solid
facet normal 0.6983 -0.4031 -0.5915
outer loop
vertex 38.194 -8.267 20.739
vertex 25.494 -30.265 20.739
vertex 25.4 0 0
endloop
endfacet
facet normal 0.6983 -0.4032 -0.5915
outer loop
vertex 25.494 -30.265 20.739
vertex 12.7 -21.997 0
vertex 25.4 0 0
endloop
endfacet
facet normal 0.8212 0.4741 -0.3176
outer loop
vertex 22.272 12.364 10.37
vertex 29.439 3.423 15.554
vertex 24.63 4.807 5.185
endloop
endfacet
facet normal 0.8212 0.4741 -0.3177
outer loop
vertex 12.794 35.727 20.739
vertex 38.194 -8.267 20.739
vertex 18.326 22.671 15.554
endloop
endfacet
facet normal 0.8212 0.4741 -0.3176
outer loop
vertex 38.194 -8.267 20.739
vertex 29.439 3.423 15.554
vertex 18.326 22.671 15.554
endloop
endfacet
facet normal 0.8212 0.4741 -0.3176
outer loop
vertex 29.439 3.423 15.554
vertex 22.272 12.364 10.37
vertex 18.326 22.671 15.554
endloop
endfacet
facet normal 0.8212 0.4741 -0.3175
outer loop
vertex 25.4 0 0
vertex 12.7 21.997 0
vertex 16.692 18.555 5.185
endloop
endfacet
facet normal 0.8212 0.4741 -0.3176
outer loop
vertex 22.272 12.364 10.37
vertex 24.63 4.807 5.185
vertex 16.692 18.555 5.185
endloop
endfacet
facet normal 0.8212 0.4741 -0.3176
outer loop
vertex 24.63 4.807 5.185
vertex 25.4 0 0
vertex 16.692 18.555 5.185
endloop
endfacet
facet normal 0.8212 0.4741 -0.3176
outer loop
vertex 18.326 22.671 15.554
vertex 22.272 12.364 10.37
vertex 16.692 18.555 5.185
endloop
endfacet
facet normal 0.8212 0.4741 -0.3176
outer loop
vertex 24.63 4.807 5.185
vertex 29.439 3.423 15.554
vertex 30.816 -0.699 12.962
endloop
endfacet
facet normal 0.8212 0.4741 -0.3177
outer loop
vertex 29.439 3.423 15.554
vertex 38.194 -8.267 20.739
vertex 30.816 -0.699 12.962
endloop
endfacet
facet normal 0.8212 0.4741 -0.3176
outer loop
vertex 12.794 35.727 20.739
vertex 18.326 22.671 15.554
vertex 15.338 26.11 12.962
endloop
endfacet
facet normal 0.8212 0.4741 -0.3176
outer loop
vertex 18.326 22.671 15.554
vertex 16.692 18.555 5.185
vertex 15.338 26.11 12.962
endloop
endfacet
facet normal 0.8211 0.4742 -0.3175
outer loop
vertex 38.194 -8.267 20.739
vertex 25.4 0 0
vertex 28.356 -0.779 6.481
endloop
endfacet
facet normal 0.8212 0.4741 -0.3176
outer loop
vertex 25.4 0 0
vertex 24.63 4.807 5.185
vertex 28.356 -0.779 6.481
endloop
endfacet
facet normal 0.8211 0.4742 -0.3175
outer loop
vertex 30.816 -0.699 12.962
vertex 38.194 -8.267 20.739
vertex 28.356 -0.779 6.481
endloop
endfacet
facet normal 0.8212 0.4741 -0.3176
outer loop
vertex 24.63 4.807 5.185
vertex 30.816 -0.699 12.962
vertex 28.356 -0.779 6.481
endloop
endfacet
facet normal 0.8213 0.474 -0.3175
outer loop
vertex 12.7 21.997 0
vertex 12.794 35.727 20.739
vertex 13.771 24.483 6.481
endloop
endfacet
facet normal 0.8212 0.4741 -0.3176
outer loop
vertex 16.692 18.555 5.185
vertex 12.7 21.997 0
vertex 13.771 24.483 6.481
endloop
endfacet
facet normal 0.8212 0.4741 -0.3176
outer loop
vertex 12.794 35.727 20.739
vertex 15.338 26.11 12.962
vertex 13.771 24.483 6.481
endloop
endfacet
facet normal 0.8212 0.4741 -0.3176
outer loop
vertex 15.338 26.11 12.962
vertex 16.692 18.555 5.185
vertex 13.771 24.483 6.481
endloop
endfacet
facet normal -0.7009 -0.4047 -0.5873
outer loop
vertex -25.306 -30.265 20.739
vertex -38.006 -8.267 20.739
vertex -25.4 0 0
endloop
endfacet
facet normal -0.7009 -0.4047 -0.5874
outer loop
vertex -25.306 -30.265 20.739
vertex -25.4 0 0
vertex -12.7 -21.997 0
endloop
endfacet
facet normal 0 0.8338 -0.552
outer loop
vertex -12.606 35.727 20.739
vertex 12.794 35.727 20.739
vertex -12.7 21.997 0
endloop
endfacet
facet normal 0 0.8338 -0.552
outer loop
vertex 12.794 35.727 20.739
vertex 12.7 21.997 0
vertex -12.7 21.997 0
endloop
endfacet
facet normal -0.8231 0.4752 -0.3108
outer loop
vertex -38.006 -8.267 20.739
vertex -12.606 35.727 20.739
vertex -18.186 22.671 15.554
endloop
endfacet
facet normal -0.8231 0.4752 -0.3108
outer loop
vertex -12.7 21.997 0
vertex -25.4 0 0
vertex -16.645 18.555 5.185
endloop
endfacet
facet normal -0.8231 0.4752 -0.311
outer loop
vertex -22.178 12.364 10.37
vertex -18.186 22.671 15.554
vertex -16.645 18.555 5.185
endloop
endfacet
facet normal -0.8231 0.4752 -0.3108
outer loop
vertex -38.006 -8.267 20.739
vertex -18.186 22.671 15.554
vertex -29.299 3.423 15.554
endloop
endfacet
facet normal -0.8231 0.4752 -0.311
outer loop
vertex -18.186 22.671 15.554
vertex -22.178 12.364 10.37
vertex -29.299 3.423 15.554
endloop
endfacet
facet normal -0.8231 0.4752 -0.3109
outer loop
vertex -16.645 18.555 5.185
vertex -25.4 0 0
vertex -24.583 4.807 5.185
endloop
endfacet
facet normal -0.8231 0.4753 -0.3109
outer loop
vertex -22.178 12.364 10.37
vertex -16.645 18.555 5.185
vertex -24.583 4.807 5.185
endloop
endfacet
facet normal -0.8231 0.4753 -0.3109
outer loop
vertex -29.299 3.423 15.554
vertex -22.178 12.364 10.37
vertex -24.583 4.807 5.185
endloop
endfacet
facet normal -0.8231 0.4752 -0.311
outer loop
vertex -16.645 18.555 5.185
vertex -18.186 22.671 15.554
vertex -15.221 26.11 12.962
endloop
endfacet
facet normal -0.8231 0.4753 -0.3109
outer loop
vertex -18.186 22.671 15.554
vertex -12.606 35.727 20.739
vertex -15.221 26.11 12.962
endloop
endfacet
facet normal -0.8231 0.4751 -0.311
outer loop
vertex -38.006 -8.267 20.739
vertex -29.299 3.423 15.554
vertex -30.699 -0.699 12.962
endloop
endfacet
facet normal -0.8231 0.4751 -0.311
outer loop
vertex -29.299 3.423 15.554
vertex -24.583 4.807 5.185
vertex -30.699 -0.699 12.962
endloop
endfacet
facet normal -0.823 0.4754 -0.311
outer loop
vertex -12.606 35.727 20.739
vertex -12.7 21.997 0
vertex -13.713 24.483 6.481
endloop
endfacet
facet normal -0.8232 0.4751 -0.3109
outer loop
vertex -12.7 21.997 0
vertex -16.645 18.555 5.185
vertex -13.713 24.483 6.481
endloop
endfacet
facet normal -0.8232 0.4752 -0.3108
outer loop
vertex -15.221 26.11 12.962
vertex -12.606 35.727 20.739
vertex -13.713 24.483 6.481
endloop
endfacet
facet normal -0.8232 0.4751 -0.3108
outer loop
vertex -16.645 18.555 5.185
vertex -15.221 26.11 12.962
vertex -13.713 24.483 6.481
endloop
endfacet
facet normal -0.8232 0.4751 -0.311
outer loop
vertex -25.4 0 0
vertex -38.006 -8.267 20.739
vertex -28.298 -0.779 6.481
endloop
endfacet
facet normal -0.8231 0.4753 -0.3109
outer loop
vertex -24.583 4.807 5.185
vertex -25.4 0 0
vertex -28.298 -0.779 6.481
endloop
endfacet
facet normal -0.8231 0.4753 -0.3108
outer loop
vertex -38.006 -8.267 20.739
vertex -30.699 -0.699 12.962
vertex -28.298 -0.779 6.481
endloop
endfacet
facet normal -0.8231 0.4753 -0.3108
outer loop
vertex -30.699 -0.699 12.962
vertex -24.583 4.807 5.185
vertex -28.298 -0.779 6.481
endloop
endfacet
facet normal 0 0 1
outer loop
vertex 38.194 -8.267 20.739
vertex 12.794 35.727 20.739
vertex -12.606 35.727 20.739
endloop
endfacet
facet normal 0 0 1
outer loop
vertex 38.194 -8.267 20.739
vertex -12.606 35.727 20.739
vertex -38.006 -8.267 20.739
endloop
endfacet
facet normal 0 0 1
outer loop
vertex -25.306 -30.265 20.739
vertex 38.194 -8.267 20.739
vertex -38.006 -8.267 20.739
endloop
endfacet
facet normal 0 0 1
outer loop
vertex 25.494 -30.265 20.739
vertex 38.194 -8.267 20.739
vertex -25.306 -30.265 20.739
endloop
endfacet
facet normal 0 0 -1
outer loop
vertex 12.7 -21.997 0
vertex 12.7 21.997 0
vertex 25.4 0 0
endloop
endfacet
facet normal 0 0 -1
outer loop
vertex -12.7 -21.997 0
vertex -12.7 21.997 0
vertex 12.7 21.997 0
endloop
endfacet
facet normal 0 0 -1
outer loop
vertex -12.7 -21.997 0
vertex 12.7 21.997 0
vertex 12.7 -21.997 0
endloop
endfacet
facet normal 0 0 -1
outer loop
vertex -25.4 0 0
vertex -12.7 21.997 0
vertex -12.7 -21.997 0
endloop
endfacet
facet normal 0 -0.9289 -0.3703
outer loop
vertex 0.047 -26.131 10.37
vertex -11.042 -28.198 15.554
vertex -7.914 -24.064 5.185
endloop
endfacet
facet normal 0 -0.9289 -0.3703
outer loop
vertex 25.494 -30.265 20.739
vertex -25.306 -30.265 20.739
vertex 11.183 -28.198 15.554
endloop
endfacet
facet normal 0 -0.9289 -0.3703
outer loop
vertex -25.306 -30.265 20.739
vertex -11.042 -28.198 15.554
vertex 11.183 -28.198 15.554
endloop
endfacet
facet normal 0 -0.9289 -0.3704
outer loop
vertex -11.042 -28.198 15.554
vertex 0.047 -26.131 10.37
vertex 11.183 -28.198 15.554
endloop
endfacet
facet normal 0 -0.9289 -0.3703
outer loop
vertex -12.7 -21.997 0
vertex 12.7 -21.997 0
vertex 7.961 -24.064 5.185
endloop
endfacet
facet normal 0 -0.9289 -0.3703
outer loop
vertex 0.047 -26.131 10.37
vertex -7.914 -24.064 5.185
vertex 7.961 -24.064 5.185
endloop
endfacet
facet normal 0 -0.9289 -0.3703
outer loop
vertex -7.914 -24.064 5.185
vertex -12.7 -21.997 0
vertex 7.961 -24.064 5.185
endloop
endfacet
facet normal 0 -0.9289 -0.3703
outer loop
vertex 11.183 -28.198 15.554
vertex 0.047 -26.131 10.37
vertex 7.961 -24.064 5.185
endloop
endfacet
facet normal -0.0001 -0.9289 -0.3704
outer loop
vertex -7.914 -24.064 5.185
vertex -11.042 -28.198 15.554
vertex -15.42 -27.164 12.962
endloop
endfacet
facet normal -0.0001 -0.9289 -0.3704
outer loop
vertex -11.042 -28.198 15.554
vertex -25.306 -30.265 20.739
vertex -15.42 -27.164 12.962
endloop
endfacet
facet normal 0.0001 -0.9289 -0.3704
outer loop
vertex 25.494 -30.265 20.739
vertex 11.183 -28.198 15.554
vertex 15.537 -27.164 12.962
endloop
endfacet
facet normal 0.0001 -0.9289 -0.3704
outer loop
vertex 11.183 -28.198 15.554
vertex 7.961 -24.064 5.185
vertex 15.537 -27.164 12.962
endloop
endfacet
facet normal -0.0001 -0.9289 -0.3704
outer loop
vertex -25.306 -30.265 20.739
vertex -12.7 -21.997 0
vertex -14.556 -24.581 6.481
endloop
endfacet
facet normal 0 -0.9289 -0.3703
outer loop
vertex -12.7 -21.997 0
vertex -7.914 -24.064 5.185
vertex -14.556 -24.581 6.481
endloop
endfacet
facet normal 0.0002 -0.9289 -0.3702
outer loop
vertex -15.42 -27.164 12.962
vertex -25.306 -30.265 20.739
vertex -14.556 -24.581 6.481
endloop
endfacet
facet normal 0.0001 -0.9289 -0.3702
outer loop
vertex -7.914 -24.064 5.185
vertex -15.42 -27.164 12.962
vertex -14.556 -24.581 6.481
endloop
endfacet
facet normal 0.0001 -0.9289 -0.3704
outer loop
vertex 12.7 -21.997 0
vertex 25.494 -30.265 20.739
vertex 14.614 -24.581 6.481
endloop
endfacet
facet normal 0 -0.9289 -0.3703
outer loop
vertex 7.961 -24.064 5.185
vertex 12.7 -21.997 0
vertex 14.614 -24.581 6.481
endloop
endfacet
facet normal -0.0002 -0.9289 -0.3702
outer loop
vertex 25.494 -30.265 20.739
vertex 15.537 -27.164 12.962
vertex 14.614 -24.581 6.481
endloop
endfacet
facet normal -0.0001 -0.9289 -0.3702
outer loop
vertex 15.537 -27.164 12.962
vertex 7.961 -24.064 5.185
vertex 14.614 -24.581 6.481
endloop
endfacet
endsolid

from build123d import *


with BuildPart() as f3:
    # F2 (on offset) → F3 section 0
    with BuildSketch(Plane.XY.offset(20.739013)):
        Polygon((12.793589, 35.726616), (-12.606411, 35.726616), (-38.006411, -8.267475), (-25.306411, -30.26452), (25.493589, -30.26452), (38.193589, -8.267475), align=None)
    # F0 (on Top) → F3 section 1
    with BuildSketch(Plane.XY):
        Polygon((12.7, -21.997045), (25.4, 0), (12.7, 21.997045), (-12.7, 21.997045), (-25.4, 0), (-12.7, -21.997045), align=None)
    loft()


solid = f3.part
